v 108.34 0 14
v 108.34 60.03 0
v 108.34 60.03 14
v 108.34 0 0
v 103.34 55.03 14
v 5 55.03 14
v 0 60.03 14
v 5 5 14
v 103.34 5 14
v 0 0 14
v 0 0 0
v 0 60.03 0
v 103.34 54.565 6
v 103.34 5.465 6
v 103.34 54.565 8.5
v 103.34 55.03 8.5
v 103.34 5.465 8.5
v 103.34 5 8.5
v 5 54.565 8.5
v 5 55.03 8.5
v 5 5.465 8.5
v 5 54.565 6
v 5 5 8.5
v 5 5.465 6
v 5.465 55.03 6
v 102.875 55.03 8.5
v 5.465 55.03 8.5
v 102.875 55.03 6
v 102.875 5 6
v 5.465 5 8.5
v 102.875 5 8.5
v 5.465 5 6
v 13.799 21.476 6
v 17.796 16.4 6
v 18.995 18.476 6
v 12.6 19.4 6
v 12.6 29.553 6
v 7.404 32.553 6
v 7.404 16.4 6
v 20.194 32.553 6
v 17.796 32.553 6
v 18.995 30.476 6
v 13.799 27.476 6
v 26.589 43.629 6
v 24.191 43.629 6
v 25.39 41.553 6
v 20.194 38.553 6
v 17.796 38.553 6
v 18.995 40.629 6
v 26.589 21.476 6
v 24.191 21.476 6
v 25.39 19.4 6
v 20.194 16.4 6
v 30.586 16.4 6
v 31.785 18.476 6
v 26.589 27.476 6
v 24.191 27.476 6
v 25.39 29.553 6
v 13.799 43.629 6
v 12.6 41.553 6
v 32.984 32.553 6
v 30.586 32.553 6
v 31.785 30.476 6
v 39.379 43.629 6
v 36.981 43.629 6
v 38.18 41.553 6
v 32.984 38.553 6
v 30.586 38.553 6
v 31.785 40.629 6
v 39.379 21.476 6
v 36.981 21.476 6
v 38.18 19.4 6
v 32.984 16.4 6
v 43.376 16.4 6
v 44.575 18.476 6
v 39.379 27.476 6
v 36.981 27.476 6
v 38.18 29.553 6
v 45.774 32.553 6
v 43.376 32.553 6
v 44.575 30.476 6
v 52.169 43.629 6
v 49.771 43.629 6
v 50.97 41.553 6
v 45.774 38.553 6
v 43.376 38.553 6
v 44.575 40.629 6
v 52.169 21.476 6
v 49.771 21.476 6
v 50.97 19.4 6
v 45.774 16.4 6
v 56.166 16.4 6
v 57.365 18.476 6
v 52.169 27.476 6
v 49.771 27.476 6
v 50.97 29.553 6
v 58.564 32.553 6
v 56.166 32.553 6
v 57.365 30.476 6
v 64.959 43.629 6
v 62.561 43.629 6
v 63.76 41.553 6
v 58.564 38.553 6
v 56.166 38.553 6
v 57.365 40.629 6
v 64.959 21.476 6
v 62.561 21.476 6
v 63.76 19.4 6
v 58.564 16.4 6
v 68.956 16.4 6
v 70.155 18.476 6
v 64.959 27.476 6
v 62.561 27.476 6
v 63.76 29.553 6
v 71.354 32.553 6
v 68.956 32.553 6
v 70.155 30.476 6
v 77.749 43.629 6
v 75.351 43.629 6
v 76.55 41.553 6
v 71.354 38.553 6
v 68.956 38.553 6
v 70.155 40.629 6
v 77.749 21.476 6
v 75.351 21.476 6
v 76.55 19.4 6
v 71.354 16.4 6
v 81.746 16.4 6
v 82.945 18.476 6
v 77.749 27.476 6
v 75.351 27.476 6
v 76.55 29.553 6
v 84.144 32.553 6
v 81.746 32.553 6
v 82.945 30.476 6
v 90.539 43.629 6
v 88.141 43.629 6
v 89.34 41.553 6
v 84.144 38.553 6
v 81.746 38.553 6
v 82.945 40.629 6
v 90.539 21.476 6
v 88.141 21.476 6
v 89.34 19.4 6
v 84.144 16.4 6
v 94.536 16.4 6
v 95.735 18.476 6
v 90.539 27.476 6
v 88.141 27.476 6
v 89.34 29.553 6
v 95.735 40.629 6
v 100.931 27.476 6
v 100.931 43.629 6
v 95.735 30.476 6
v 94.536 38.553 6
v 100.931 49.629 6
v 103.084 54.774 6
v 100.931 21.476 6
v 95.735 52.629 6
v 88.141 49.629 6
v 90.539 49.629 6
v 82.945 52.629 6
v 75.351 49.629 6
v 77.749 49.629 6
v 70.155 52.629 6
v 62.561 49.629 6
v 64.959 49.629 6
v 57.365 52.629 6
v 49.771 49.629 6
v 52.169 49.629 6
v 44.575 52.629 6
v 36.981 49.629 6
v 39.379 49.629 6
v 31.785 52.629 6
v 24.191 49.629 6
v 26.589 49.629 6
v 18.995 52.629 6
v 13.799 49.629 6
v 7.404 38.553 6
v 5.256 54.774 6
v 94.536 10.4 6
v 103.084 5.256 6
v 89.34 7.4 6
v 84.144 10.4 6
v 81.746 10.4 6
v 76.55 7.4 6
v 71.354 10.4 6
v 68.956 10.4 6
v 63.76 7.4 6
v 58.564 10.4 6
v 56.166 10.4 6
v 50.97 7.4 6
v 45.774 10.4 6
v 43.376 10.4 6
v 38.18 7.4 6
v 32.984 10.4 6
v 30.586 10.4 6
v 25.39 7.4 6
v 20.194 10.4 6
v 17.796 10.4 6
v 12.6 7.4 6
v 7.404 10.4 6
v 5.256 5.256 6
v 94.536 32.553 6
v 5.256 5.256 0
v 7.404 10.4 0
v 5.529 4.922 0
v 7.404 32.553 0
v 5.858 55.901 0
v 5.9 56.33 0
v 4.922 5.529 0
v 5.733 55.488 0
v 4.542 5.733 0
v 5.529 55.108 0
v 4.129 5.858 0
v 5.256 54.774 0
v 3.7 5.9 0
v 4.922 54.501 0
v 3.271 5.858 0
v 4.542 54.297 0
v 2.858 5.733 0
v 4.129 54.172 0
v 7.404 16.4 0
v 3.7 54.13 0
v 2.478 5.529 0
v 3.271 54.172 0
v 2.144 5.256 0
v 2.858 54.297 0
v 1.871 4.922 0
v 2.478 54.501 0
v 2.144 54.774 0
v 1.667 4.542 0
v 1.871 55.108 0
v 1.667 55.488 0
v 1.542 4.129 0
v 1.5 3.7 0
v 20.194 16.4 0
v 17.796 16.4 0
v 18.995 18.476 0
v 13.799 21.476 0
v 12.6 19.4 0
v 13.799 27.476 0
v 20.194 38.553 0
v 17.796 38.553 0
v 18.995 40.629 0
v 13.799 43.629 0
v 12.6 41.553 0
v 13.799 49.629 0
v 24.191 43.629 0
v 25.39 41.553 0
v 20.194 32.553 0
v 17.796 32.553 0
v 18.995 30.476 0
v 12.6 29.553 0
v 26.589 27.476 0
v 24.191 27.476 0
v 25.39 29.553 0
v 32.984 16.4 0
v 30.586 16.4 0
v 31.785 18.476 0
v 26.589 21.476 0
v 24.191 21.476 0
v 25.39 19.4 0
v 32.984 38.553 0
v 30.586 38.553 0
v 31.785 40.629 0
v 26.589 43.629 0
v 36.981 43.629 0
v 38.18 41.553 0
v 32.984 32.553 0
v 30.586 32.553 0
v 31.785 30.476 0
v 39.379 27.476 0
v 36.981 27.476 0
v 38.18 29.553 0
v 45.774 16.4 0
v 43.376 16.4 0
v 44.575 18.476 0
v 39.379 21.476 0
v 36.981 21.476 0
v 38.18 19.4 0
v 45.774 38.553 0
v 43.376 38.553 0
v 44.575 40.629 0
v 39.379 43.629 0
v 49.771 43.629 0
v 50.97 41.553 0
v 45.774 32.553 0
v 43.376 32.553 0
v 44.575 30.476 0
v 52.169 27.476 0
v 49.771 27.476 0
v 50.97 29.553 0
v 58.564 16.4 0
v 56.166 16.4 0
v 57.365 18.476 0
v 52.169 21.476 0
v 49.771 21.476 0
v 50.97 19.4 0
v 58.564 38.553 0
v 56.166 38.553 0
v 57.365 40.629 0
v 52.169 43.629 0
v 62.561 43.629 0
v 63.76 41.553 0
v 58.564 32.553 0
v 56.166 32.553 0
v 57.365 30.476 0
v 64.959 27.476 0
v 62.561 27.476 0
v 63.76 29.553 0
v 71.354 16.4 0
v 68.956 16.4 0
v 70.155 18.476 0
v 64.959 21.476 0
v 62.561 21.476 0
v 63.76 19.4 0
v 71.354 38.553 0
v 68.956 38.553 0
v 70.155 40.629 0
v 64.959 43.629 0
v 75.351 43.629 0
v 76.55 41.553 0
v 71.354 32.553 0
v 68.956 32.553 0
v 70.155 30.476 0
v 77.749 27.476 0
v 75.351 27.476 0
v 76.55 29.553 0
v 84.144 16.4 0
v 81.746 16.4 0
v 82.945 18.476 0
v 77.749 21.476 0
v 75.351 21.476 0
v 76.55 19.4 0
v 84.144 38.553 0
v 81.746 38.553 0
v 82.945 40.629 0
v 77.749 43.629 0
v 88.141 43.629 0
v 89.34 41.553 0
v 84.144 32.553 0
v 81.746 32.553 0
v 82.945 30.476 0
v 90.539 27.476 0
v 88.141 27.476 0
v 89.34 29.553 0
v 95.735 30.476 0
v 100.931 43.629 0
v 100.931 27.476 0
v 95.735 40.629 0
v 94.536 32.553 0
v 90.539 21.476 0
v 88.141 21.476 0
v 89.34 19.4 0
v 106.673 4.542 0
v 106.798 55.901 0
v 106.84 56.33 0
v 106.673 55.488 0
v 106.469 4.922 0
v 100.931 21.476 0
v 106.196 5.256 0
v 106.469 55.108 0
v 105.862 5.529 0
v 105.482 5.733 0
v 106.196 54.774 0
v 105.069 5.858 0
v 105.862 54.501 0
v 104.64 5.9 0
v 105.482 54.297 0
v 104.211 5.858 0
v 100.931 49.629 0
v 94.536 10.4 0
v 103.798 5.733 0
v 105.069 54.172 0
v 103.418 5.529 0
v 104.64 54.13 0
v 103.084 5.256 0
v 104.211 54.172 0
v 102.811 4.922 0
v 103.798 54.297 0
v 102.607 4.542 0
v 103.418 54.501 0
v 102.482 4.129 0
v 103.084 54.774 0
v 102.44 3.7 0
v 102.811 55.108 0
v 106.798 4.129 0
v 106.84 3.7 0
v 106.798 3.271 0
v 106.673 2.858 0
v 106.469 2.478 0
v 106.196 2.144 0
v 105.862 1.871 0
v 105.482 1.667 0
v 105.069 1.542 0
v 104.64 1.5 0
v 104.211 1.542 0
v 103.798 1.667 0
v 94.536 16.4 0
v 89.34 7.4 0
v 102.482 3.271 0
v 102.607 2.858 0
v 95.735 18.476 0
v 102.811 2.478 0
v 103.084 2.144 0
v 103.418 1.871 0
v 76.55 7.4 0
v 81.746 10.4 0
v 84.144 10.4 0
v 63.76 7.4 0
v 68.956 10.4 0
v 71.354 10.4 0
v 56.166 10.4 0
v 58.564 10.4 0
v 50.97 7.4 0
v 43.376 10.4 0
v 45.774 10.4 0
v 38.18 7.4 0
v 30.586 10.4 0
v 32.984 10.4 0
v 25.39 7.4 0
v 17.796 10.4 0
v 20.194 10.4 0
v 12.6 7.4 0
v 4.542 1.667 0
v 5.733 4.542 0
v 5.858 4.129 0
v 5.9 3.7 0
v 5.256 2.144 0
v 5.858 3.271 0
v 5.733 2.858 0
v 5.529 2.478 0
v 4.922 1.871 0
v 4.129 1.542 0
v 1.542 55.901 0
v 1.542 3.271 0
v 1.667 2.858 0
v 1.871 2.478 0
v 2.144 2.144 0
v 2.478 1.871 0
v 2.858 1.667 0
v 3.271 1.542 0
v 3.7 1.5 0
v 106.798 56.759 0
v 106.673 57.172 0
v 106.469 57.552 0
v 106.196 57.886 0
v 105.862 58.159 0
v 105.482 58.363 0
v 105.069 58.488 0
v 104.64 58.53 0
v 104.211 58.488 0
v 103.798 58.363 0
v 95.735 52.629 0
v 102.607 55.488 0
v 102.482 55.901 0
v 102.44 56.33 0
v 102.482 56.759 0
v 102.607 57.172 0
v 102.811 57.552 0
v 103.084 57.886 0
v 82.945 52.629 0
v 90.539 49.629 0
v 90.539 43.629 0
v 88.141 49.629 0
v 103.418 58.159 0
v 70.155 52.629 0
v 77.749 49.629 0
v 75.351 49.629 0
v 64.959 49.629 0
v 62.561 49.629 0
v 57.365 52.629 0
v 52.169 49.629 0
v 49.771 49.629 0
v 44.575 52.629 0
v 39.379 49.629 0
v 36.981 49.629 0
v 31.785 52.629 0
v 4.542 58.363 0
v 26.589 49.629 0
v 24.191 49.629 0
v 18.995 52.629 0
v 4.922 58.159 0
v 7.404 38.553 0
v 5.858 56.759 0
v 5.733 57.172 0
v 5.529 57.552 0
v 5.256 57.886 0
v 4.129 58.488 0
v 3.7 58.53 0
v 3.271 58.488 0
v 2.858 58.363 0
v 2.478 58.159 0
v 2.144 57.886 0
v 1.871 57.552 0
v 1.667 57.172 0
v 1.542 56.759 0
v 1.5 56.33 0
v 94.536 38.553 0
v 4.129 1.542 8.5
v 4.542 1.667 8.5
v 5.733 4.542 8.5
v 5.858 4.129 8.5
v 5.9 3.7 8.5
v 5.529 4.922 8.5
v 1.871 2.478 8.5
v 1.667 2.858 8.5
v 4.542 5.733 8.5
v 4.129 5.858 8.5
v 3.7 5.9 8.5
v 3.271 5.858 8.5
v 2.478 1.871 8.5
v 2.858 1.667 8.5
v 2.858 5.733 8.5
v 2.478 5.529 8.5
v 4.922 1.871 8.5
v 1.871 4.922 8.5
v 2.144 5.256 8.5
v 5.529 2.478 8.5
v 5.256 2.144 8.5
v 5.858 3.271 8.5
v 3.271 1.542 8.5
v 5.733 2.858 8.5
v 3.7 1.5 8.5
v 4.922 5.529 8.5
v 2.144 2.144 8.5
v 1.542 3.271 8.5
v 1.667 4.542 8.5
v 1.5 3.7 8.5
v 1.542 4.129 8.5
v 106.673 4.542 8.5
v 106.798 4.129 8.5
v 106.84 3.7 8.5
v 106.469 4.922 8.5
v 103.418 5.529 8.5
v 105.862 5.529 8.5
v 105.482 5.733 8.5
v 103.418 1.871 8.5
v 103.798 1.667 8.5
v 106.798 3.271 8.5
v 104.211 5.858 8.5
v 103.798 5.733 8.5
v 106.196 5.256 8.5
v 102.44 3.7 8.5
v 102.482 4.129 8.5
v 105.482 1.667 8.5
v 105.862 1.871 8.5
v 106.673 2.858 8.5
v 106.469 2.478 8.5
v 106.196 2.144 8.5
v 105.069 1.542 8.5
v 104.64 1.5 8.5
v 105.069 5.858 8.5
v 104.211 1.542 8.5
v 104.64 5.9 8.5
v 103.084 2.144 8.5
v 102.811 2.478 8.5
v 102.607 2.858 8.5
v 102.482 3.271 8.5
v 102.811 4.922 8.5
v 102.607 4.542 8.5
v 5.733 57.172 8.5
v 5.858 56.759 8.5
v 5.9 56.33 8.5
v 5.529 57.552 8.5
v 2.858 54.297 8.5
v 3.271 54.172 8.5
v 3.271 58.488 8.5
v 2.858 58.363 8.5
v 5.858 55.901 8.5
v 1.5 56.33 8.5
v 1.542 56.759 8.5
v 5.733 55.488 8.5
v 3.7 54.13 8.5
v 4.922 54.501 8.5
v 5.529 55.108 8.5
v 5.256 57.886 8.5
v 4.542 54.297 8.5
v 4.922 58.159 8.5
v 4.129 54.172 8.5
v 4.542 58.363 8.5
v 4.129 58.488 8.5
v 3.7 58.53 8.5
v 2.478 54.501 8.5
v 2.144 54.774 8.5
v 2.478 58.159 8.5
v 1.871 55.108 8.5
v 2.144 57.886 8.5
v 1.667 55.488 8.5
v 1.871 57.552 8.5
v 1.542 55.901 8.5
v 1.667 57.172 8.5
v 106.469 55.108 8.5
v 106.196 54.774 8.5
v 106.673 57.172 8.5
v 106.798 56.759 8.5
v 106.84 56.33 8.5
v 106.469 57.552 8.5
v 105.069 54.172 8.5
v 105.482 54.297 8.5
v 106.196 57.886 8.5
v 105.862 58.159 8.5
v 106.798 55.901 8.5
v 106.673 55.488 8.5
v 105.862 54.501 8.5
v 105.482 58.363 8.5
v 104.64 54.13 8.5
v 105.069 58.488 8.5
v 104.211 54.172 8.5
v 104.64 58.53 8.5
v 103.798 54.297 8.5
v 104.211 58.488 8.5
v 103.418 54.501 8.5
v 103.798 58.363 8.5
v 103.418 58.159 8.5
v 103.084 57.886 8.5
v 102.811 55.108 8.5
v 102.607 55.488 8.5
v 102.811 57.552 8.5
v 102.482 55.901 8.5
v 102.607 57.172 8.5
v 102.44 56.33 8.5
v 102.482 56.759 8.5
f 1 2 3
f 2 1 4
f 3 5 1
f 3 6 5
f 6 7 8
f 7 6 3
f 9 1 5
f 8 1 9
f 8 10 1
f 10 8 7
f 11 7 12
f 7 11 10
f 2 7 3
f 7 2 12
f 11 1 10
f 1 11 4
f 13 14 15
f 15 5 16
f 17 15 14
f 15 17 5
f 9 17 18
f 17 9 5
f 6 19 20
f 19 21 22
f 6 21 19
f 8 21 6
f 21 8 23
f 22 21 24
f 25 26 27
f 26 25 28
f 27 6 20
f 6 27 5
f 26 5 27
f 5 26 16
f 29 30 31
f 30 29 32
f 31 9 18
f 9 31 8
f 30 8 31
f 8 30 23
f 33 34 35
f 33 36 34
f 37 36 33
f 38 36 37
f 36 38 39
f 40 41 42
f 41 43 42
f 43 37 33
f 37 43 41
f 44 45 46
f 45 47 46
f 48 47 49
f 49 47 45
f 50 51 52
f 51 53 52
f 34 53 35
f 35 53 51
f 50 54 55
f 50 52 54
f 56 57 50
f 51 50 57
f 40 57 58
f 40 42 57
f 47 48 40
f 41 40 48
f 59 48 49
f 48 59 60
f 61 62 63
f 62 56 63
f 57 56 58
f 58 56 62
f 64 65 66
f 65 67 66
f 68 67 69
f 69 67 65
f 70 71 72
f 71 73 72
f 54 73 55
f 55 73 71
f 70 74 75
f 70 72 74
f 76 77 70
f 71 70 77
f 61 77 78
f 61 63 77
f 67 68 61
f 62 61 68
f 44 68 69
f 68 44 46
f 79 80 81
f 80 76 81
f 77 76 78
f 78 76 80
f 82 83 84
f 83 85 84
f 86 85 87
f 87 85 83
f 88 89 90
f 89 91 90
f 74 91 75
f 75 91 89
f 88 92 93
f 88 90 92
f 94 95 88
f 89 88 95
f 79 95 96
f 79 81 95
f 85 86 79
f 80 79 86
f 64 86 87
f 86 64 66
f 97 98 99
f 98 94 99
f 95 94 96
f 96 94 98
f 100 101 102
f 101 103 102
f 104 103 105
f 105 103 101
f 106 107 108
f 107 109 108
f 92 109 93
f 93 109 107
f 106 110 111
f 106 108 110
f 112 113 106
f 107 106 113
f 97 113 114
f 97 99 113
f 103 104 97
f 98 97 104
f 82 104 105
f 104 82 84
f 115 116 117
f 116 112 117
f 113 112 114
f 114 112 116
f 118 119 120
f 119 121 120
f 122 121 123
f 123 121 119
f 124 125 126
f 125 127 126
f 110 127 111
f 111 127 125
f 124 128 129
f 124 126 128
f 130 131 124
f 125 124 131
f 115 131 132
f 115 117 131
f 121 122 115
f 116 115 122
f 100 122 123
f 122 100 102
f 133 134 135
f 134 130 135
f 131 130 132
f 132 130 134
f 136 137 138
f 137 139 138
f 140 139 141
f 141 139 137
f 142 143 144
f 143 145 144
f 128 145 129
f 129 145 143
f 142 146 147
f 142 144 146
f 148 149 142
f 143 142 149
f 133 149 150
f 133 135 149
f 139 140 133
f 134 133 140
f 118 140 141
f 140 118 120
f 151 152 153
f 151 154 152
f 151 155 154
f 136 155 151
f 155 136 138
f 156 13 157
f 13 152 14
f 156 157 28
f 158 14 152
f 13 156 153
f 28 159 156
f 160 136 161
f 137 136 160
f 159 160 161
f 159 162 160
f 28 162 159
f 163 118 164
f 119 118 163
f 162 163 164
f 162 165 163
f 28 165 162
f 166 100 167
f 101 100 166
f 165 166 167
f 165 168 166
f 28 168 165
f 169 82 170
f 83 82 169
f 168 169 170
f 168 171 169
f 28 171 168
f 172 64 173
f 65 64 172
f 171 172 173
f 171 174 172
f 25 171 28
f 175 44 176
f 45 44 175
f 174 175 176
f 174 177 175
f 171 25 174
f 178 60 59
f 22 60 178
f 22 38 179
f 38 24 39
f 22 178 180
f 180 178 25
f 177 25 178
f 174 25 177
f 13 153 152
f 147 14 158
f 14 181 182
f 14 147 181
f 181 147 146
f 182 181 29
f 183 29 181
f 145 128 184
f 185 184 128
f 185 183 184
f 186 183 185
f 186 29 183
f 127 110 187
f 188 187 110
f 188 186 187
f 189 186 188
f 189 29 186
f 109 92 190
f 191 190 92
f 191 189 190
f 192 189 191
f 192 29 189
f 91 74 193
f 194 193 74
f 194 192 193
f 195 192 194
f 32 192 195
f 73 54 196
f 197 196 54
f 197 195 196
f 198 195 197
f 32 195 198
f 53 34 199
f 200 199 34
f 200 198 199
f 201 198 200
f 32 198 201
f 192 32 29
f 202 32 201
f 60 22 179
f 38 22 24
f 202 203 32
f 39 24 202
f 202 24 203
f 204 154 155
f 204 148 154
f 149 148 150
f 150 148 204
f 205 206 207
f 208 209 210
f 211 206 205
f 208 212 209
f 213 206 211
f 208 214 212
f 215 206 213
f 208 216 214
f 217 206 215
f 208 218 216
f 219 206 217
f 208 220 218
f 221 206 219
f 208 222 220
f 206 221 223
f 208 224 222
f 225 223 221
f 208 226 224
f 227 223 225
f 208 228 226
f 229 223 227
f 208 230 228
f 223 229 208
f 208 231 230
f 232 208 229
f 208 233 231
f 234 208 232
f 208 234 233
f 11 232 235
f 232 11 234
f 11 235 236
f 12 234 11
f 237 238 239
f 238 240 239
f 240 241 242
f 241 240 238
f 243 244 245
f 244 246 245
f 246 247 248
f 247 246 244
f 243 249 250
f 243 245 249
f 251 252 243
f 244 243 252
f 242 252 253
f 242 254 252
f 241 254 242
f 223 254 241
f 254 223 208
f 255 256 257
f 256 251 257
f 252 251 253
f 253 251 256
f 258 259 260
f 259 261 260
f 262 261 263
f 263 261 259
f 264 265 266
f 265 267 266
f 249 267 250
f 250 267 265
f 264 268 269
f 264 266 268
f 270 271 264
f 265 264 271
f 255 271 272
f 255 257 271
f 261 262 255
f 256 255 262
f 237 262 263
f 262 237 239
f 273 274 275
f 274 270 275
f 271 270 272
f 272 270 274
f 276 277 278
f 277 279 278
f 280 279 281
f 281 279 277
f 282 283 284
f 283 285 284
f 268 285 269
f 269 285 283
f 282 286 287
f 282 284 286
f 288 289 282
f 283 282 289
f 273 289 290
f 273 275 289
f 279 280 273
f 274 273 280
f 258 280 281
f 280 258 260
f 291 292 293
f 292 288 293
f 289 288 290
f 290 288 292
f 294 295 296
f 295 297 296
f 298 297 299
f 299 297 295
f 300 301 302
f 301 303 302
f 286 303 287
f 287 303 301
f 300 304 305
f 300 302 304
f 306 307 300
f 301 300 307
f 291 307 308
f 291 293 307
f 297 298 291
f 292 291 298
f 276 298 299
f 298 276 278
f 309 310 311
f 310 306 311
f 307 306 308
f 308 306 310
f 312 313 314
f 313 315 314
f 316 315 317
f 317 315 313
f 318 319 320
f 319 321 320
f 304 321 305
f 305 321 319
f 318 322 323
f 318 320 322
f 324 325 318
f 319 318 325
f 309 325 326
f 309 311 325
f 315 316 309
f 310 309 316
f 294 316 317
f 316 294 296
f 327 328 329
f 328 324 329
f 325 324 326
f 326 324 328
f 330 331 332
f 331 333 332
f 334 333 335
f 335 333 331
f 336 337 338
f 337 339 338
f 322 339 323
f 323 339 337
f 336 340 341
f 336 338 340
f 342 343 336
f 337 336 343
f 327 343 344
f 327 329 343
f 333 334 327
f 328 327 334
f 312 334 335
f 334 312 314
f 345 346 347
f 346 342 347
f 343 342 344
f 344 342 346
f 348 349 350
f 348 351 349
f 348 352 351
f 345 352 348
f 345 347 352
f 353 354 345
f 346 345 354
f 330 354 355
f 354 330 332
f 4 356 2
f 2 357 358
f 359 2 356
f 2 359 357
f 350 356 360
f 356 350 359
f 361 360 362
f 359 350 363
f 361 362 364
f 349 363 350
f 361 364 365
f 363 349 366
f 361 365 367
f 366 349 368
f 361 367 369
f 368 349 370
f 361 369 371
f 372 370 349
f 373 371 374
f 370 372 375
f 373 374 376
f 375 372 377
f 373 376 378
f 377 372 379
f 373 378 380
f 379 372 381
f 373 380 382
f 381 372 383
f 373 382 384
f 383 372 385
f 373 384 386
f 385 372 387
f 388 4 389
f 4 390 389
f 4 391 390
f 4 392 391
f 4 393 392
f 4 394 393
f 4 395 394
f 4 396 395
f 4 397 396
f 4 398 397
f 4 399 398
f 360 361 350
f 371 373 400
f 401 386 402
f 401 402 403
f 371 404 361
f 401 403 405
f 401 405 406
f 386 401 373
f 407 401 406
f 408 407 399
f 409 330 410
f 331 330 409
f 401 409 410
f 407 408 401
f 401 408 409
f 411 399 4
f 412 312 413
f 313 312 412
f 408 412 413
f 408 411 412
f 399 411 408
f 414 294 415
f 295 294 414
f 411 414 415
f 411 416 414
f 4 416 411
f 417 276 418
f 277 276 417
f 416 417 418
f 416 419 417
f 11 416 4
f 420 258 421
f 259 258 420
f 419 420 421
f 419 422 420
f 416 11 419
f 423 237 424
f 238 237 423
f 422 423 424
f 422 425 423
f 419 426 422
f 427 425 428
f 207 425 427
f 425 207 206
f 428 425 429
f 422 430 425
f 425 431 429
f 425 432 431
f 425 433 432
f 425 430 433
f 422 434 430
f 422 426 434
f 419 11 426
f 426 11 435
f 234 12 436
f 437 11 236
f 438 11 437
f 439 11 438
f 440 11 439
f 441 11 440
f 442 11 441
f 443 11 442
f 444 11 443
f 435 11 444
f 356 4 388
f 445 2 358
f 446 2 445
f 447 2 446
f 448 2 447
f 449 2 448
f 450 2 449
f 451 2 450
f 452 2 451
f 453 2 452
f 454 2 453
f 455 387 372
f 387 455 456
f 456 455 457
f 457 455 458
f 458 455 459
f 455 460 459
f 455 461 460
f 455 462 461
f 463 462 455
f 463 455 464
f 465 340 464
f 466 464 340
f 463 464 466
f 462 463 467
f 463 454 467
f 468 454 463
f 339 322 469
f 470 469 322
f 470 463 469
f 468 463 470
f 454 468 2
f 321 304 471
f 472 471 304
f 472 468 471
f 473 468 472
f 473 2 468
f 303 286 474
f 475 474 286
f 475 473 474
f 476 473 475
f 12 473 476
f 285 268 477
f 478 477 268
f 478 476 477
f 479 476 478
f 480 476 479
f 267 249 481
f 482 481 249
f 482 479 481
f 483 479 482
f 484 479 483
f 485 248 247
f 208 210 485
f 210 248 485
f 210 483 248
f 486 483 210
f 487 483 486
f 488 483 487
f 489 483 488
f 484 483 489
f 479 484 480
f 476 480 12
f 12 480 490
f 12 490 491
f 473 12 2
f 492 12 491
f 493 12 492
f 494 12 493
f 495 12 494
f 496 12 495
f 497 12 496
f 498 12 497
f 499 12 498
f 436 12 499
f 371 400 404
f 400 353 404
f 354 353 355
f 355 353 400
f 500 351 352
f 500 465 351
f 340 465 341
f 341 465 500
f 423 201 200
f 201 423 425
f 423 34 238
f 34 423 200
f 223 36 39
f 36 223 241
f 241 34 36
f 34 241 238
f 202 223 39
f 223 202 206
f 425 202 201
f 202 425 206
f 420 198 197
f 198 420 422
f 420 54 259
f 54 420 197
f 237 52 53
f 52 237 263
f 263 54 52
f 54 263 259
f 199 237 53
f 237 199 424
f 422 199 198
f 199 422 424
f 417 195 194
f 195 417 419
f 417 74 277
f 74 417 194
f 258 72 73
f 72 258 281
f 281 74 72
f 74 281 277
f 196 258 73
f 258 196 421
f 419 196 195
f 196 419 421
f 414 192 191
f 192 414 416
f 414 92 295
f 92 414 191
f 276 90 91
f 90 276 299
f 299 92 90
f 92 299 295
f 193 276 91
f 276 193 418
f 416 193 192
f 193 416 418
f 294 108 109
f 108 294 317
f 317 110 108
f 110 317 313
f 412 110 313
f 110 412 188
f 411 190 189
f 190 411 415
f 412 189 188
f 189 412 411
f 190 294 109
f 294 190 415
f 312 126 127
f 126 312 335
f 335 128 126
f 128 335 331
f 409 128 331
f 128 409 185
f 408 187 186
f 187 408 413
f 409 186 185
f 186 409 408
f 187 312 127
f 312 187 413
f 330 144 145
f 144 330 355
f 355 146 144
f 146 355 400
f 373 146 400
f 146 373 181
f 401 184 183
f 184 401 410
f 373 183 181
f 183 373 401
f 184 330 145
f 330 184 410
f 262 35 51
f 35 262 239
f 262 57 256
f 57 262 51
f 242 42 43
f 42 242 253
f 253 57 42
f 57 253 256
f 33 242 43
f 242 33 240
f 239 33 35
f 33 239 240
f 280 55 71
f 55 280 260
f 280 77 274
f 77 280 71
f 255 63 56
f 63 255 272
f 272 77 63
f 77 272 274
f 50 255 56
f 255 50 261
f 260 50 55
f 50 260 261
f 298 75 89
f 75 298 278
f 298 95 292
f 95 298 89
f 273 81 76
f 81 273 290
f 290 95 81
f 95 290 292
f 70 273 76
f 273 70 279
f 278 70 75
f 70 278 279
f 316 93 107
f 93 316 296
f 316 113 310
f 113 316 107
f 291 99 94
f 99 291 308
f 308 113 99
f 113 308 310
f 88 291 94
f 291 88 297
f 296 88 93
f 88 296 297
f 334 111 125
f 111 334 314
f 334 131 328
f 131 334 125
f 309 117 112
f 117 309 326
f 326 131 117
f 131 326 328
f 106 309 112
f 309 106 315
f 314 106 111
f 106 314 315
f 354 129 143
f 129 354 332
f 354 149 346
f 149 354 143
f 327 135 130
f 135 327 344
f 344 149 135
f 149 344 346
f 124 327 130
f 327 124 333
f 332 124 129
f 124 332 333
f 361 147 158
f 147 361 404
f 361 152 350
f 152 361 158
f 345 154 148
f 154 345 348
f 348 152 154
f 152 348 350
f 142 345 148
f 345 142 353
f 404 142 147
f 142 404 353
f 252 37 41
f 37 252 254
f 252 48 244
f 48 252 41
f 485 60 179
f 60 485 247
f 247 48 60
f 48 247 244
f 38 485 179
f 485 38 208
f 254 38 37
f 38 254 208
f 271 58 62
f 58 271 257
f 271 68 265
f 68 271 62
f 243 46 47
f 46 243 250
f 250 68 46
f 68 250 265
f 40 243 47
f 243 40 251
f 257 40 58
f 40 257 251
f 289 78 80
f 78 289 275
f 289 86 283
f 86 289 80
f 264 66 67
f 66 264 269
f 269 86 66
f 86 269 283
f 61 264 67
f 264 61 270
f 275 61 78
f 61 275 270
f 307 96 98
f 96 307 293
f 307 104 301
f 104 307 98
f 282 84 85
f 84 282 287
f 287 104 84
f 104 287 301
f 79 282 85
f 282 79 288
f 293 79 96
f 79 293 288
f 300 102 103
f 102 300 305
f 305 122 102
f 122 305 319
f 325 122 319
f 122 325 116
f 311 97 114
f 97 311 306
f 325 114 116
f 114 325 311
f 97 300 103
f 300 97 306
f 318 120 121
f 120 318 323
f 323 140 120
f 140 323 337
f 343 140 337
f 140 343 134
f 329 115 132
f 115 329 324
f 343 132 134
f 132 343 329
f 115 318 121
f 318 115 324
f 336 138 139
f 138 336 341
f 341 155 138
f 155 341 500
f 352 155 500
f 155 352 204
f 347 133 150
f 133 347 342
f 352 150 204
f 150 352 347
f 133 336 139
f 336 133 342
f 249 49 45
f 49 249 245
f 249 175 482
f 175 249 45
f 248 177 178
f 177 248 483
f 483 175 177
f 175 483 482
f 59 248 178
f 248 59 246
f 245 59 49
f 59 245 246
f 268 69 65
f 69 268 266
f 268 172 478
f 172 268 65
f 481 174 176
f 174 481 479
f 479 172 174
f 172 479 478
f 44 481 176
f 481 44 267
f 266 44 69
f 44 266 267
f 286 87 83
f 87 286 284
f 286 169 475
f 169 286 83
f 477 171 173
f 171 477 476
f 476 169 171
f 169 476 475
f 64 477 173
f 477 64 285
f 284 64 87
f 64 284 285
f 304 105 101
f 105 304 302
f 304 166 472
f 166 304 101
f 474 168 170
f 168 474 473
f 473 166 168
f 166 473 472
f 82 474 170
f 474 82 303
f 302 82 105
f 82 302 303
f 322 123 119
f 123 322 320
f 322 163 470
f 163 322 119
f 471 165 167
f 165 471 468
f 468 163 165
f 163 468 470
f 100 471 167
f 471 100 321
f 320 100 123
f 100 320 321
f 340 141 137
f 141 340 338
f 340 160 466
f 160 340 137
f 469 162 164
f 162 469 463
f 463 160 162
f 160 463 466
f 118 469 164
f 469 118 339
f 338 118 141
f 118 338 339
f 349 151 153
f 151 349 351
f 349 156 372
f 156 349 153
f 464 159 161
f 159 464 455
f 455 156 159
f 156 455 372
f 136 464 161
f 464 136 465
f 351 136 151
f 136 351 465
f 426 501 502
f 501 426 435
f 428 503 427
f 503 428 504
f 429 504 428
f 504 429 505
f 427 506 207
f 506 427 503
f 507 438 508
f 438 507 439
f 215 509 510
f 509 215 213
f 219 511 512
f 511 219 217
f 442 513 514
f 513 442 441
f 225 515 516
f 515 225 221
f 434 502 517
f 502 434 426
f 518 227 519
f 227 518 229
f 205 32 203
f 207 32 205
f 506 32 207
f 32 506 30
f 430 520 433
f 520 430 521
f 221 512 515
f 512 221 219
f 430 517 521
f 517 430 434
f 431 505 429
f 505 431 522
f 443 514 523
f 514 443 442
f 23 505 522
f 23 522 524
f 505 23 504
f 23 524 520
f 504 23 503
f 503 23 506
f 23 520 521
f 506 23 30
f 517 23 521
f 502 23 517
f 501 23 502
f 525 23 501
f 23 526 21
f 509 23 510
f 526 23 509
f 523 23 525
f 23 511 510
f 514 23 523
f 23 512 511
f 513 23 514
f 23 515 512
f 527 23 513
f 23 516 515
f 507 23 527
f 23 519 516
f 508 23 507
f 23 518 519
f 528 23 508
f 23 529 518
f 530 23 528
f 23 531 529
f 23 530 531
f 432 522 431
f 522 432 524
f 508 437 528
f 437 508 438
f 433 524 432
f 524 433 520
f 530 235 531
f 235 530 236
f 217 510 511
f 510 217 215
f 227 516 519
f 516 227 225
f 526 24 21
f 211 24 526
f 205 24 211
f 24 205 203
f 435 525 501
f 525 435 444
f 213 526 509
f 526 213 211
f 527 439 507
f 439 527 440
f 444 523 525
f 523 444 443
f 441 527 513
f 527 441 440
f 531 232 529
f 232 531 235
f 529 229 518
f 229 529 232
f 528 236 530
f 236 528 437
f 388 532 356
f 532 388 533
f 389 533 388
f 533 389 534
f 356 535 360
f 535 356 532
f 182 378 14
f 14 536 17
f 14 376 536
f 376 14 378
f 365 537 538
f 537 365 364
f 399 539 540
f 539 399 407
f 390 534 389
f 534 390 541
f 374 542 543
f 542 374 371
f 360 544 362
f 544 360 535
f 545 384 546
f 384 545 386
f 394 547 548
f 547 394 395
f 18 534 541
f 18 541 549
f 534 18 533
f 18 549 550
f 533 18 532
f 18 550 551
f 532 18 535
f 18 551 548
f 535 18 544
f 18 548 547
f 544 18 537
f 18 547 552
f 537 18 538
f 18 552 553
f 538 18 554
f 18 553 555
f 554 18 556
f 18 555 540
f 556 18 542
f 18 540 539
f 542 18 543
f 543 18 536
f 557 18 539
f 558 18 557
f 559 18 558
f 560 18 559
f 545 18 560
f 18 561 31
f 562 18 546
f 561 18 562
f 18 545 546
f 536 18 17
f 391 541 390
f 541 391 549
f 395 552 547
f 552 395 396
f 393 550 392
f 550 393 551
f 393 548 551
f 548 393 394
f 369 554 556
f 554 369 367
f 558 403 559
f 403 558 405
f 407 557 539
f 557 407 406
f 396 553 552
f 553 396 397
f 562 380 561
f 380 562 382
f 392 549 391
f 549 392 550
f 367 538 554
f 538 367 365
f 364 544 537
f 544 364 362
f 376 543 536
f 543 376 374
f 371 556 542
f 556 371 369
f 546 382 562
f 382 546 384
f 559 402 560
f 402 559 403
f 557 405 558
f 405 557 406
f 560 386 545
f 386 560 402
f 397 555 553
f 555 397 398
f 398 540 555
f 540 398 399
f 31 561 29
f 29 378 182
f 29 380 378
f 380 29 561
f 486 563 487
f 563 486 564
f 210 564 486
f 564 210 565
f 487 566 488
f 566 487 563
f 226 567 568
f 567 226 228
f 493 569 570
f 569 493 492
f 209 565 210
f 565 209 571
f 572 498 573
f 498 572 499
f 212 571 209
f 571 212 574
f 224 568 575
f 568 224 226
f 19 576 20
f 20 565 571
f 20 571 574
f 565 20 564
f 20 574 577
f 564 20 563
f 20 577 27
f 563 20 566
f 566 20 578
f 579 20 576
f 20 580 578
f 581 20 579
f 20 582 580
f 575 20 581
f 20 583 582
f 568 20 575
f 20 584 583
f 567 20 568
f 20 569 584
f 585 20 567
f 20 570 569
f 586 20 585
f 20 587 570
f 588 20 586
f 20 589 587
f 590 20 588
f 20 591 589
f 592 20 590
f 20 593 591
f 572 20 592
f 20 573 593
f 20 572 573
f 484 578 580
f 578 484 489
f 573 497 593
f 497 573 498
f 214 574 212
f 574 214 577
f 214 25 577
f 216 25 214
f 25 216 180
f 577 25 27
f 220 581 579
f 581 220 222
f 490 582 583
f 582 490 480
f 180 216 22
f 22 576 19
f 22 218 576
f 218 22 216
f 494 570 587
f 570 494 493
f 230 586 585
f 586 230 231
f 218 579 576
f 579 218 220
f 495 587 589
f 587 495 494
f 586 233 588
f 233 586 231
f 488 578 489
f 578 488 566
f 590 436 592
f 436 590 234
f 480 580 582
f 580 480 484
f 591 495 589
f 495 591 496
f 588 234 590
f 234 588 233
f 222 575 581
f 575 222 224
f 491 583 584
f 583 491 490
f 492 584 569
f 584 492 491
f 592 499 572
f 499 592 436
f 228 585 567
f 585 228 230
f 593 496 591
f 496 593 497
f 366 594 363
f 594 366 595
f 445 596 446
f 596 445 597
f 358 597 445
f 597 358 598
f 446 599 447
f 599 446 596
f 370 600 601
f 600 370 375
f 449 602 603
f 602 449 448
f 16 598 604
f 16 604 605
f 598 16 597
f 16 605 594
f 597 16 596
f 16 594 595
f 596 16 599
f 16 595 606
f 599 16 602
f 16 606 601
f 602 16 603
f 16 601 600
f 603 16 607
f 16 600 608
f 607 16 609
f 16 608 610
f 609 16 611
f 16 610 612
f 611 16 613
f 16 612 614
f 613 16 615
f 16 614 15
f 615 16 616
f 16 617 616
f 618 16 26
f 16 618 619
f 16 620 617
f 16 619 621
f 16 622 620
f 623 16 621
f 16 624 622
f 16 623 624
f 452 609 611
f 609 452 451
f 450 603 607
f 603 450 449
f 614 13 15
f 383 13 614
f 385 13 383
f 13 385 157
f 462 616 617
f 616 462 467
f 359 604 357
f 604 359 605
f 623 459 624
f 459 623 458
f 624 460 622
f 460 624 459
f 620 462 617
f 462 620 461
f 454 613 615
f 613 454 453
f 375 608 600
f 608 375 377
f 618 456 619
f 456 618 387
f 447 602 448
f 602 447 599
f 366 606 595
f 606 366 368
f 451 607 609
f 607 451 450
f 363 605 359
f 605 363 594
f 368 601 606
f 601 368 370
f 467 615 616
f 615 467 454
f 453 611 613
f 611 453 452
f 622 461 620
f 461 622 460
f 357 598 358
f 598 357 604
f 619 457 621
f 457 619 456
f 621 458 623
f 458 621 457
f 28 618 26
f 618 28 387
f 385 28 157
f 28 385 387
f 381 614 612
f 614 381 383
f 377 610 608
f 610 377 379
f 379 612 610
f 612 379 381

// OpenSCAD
$fn = 32;

// ----------------------------------------------------------------------
// Honeycomb panel: 108.34 x 60.03 mm, 28 cells of 12 mm
// ----------------------------------------------------------------------

// --- parameters (mm) ---
panel_w = 108.34;         // panel width
panel_d = 60.03;          // panel depth
thick = 6;                // panel thickness
cell_r = 6;               // hex cell circumradius
pitch = 12.79;            // hex cell pitch (centre to centre)
web = 2.4;                // web between the cells
columns = 7;              // columns of cells
rows = 4;                 // rows of cells
cell_count = 28;          // total cells
shift_x = 12.6;           // first cell offset in x
shift_y = 13.4;           // first cell offset in y
mount_d = 4.4;            // corner mounting holes
hole_off = 3.7;           // mounting hole offset from the corners
rim_h = 14;               // rim height
rim_t = 5;                // rim wall thickness

difference() {
  union() {
    cube([panel_w, panel_d, thick]);
    /* rim around the panel, sunk 1 mm into the plate */
    translate([0, 0, thick - 1]) difference() {
      cube([panel_w, panel_d, rim_h - thick + 1]);
      translate([rim_t, rim_t, -2.5]) cube([panel_w - 2 * rim_t, panel_d - 2 * rim_t, rim_h - thick + 6]);
    }
  }
  /* hexagonal cells, point-up, cut right through the plate */
  for (row = [0 : rows - 1]) {
    for (col = [0 : columns - 1]) {
      translate([shift_x + col * pitch + (row % 2) * pitch / 2, shift_y + row * pitch * 0.866025, -2.5]) rotate([0, 0, 30]) cylinder(h = thick + 5, d = 2 * cell_r, $fn = 6);
    }
  }
  /* corner mounting holes, clear of the outer cell web */
  translate([3.7, 3.7, -2.5]) cylinder(h = thick + 5, d = mount_d);
  translate([104.64, 3.7, -2.5]) cylinder(h = thick + 5, d = mount_d);
  translate([3.7, 56.33, -2.5]) cylinder(h = thick + 5, d = mount_d);
  translate([104.64, 56.33, -2.5]) cylinder(h = thick + 5, d = mount_d);
}
